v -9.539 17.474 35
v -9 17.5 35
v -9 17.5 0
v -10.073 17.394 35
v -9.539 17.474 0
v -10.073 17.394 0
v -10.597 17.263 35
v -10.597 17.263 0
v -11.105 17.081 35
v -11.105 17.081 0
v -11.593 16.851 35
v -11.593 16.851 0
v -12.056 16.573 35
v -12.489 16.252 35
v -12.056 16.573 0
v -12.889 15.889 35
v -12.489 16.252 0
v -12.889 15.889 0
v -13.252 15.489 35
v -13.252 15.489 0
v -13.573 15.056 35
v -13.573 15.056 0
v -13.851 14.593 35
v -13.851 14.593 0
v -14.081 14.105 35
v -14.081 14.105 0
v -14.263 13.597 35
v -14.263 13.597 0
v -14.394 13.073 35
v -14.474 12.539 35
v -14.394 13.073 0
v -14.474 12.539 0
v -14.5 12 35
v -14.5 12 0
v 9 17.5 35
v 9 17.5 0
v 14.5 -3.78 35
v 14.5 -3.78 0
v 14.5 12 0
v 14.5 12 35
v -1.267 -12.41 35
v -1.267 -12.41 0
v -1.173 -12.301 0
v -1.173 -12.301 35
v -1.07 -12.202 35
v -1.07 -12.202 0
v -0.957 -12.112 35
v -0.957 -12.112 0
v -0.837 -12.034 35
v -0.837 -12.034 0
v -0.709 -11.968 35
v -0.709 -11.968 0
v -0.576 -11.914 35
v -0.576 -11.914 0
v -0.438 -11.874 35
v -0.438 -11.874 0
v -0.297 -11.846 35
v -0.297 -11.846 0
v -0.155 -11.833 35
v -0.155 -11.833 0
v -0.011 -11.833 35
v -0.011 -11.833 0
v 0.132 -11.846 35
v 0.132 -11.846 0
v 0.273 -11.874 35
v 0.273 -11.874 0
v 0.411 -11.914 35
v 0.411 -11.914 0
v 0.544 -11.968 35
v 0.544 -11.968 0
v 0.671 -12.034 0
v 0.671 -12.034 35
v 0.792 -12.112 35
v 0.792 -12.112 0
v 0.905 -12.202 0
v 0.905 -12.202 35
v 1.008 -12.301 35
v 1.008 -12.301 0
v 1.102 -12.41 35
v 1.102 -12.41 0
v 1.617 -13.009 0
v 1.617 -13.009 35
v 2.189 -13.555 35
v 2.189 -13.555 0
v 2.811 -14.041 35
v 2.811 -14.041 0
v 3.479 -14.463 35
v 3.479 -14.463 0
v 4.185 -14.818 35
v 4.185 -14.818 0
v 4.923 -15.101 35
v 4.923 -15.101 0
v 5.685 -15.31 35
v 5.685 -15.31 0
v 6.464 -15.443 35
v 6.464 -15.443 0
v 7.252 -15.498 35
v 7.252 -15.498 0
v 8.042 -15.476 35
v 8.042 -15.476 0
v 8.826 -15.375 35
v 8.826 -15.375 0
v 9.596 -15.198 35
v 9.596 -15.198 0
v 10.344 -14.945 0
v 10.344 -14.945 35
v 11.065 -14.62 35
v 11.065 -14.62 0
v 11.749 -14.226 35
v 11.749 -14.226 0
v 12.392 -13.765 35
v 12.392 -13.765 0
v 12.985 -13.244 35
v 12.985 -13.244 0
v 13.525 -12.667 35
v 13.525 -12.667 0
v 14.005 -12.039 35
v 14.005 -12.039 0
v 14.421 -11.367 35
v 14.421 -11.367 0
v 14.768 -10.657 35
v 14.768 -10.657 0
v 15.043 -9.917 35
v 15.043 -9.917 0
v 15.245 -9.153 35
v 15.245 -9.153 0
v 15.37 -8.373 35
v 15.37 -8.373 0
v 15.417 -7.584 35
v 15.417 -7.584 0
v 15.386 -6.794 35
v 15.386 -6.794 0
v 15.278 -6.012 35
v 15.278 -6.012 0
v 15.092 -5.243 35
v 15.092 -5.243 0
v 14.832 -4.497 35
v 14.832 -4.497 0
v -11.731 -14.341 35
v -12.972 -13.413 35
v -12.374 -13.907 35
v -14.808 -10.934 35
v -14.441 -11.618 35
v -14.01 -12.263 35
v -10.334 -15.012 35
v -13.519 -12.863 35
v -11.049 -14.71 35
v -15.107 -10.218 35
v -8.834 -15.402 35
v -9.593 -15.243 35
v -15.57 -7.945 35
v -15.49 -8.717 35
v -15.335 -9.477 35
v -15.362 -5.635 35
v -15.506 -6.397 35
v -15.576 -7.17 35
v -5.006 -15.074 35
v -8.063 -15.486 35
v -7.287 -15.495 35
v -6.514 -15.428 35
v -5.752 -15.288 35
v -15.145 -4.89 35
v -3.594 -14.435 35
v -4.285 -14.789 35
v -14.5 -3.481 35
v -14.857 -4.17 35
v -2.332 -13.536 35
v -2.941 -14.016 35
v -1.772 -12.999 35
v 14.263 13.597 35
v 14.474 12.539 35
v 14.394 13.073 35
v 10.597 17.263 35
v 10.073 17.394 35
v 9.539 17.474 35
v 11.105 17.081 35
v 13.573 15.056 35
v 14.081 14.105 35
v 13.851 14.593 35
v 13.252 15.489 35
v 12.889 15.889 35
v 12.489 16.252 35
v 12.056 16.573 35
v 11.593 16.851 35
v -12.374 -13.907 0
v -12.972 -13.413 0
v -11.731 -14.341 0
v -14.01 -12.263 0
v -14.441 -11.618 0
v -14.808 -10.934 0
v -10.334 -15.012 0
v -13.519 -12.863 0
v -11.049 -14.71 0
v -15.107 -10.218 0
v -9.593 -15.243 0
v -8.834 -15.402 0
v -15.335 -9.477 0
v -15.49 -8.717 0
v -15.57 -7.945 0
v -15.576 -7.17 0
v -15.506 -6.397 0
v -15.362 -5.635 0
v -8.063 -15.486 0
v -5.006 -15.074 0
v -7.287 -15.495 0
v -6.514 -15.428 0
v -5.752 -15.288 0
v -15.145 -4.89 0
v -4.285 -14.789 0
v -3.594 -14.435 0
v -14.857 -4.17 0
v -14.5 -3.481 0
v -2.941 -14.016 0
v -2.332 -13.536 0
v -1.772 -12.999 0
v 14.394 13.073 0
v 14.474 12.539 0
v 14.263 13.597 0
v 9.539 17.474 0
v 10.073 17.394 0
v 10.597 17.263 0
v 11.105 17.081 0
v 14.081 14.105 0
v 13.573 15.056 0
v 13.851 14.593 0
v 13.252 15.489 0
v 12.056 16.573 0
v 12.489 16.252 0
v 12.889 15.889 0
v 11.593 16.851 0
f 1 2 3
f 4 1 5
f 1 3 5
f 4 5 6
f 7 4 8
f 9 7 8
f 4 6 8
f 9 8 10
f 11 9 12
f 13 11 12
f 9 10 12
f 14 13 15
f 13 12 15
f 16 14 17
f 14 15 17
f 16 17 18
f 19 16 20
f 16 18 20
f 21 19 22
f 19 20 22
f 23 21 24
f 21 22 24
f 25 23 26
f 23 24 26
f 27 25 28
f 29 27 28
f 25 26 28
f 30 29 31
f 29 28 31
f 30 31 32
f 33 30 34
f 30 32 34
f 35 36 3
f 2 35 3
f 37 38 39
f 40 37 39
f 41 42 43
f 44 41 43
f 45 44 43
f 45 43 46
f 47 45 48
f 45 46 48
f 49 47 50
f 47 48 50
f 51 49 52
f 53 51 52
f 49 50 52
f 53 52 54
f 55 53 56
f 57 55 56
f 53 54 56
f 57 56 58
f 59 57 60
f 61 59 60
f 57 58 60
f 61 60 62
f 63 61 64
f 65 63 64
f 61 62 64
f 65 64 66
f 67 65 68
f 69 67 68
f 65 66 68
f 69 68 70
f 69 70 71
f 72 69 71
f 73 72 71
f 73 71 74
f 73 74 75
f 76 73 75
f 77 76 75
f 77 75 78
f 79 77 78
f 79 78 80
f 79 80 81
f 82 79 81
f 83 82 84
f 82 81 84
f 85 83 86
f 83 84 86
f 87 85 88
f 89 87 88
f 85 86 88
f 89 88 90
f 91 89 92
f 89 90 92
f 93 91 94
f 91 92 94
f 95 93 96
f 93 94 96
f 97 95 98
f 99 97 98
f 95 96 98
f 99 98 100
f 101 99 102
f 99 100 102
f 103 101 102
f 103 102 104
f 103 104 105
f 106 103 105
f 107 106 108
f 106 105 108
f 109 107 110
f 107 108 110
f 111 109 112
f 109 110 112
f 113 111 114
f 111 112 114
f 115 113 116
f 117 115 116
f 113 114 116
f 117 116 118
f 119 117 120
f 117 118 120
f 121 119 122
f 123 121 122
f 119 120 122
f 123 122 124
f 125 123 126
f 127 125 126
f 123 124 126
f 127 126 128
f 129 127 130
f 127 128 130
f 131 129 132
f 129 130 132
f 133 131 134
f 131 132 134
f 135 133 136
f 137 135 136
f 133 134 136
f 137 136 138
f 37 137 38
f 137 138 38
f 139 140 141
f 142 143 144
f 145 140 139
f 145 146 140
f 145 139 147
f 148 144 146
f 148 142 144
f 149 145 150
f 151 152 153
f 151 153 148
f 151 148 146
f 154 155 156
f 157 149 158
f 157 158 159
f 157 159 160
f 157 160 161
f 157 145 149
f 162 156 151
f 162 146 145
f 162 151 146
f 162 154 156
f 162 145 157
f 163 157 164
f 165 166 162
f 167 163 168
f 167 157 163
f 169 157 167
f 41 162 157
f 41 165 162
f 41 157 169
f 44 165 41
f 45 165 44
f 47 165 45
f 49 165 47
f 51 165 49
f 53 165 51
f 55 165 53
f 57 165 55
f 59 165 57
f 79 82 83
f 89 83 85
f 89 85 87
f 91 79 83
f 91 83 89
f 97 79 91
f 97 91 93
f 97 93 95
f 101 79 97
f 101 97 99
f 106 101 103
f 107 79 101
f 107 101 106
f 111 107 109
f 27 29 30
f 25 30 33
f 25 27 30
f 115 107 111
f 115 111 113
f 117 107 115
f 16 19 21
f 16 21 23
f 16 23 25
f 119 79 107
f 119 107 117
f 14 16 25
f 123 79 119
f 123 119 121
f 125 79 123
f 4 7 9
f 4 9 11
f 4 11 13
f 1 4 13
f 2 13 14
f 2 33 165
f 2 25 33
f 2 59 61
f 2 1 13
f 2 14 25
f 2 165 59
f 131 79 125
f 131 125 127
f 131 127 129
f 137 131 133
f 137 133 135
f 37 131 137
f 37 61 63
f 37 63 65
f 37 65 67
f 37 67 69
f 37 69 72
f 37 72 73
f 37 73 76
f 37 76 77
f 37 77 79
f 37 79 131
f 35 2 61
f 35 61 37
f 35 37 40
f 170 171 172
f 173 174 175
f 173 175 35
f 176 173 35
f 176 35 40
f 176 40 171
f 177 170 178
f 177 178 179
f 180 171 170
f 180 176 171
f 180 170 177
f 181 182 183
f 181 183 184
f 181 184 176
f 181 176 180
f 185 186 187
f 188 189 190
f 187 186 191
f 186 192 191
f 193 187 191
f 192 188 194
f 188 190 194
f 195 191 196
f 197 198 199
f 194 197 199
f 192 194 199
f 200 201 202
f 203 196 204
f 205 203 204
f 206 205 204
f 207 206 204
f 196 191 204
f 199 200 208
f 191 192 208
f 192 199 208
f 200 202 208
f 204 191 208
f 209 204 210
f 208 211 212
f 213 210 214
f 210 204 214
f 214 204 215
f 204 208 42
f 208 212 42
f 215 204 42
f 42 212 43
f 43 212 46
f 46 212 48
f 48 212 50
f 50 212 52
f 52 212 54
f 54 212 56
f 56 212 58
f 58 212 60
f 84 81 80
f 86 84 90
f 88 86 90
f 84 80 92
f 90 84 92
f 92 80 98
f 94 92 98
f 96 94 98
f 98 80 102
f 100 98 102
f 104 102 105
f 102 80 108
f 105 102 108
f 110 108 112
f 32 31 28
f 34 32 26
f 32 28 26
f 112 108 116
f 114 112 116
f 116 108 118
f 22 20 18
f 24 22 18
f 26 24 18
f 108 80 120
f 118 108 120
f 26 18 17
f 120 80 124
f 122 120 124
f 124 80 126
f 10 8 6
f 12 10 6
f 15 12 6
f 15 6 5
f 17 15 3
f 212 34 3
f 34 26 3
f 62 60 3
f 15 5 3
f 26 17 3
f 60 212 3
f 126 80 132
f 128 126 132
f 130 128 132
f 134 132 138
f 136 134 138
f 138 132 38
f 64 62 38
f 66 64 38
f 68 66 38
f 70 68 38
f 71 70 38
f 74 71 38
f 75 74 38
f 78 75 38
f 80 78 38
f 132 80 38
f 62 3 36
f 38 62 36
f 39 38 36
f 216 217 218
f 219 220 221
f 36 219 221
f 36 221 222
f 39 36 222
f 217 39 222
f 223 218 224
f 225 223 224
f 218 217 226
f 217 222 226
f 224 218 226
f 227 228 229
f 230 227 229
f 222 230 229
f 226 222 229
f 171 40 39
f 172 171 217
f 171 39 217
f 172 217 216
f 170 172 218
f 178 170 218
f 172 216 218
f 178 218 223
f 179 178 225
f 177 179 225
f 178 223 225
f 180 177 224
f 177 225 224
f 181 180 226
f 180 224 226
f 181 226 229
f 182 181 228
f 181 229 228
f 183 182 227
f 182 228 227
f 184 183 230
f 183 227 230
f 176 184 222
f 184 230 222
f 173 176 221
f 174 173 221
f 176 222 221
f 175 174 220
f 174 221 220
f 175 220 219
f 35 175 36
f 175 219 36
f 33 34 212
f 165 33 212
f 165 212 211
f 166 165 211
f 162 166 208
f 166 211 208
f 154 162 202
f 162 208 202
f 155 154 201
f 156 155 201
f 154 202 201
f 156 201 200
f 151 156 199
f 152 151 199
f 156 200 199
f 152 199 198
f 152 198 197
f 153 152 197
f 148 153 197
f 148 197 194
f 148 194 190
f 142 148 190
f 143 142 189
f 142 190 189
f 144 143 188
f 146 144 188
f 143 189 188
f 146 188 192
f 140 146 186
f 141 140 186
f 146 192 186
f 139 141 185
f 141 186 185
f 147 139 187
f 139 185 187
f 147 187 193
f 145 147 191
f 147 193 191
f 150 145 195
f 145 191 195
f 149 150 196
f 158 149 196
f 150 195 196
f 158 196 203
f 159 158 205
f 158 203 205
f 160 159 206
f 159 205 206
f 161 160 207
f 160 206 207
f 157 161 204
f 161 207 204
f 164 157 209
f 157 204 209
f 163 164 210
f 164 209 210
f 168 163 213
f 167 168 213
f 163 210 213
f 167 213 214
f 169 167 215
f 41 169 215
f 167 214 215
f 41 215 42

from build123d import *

# Parameters (mm, degrees)
F1_DEPTH = 35


with BuildPart() as f1:
    # F0 (on Top) → F1 (new body)
    with BuildSketch(Plane.XY):
        with BuildLine():
            Line((9, 17.5), (-9, 17.5))
            ThreePointArc((-9, 17.5), (-12.889087, 15.889087), (-14.5, 12))
            Line((-14.5, 12), (-14.5, -3.481193))
            ThreePointArc((-14.5, -3.481193), (-12.057349, -14.131547), (-1.2669, -12.410275))
            ThreePointArc((-1.2669, -12.410275), (-0.082689, -11.830952), (1.101521, -12.410275))
            ThreePointArc((1.101521, -12.410275), (11.749259, -14.225639), (14.5, -3.780388))
            Line((14.5, -3.780388), (14.5, 12))
            ThreePointArc((14.5, 12), (12.889087, 15.889087), (9, 17.5))
        make_face()
    extrude(amount=F1_DEPTH)


solid = f1.part
